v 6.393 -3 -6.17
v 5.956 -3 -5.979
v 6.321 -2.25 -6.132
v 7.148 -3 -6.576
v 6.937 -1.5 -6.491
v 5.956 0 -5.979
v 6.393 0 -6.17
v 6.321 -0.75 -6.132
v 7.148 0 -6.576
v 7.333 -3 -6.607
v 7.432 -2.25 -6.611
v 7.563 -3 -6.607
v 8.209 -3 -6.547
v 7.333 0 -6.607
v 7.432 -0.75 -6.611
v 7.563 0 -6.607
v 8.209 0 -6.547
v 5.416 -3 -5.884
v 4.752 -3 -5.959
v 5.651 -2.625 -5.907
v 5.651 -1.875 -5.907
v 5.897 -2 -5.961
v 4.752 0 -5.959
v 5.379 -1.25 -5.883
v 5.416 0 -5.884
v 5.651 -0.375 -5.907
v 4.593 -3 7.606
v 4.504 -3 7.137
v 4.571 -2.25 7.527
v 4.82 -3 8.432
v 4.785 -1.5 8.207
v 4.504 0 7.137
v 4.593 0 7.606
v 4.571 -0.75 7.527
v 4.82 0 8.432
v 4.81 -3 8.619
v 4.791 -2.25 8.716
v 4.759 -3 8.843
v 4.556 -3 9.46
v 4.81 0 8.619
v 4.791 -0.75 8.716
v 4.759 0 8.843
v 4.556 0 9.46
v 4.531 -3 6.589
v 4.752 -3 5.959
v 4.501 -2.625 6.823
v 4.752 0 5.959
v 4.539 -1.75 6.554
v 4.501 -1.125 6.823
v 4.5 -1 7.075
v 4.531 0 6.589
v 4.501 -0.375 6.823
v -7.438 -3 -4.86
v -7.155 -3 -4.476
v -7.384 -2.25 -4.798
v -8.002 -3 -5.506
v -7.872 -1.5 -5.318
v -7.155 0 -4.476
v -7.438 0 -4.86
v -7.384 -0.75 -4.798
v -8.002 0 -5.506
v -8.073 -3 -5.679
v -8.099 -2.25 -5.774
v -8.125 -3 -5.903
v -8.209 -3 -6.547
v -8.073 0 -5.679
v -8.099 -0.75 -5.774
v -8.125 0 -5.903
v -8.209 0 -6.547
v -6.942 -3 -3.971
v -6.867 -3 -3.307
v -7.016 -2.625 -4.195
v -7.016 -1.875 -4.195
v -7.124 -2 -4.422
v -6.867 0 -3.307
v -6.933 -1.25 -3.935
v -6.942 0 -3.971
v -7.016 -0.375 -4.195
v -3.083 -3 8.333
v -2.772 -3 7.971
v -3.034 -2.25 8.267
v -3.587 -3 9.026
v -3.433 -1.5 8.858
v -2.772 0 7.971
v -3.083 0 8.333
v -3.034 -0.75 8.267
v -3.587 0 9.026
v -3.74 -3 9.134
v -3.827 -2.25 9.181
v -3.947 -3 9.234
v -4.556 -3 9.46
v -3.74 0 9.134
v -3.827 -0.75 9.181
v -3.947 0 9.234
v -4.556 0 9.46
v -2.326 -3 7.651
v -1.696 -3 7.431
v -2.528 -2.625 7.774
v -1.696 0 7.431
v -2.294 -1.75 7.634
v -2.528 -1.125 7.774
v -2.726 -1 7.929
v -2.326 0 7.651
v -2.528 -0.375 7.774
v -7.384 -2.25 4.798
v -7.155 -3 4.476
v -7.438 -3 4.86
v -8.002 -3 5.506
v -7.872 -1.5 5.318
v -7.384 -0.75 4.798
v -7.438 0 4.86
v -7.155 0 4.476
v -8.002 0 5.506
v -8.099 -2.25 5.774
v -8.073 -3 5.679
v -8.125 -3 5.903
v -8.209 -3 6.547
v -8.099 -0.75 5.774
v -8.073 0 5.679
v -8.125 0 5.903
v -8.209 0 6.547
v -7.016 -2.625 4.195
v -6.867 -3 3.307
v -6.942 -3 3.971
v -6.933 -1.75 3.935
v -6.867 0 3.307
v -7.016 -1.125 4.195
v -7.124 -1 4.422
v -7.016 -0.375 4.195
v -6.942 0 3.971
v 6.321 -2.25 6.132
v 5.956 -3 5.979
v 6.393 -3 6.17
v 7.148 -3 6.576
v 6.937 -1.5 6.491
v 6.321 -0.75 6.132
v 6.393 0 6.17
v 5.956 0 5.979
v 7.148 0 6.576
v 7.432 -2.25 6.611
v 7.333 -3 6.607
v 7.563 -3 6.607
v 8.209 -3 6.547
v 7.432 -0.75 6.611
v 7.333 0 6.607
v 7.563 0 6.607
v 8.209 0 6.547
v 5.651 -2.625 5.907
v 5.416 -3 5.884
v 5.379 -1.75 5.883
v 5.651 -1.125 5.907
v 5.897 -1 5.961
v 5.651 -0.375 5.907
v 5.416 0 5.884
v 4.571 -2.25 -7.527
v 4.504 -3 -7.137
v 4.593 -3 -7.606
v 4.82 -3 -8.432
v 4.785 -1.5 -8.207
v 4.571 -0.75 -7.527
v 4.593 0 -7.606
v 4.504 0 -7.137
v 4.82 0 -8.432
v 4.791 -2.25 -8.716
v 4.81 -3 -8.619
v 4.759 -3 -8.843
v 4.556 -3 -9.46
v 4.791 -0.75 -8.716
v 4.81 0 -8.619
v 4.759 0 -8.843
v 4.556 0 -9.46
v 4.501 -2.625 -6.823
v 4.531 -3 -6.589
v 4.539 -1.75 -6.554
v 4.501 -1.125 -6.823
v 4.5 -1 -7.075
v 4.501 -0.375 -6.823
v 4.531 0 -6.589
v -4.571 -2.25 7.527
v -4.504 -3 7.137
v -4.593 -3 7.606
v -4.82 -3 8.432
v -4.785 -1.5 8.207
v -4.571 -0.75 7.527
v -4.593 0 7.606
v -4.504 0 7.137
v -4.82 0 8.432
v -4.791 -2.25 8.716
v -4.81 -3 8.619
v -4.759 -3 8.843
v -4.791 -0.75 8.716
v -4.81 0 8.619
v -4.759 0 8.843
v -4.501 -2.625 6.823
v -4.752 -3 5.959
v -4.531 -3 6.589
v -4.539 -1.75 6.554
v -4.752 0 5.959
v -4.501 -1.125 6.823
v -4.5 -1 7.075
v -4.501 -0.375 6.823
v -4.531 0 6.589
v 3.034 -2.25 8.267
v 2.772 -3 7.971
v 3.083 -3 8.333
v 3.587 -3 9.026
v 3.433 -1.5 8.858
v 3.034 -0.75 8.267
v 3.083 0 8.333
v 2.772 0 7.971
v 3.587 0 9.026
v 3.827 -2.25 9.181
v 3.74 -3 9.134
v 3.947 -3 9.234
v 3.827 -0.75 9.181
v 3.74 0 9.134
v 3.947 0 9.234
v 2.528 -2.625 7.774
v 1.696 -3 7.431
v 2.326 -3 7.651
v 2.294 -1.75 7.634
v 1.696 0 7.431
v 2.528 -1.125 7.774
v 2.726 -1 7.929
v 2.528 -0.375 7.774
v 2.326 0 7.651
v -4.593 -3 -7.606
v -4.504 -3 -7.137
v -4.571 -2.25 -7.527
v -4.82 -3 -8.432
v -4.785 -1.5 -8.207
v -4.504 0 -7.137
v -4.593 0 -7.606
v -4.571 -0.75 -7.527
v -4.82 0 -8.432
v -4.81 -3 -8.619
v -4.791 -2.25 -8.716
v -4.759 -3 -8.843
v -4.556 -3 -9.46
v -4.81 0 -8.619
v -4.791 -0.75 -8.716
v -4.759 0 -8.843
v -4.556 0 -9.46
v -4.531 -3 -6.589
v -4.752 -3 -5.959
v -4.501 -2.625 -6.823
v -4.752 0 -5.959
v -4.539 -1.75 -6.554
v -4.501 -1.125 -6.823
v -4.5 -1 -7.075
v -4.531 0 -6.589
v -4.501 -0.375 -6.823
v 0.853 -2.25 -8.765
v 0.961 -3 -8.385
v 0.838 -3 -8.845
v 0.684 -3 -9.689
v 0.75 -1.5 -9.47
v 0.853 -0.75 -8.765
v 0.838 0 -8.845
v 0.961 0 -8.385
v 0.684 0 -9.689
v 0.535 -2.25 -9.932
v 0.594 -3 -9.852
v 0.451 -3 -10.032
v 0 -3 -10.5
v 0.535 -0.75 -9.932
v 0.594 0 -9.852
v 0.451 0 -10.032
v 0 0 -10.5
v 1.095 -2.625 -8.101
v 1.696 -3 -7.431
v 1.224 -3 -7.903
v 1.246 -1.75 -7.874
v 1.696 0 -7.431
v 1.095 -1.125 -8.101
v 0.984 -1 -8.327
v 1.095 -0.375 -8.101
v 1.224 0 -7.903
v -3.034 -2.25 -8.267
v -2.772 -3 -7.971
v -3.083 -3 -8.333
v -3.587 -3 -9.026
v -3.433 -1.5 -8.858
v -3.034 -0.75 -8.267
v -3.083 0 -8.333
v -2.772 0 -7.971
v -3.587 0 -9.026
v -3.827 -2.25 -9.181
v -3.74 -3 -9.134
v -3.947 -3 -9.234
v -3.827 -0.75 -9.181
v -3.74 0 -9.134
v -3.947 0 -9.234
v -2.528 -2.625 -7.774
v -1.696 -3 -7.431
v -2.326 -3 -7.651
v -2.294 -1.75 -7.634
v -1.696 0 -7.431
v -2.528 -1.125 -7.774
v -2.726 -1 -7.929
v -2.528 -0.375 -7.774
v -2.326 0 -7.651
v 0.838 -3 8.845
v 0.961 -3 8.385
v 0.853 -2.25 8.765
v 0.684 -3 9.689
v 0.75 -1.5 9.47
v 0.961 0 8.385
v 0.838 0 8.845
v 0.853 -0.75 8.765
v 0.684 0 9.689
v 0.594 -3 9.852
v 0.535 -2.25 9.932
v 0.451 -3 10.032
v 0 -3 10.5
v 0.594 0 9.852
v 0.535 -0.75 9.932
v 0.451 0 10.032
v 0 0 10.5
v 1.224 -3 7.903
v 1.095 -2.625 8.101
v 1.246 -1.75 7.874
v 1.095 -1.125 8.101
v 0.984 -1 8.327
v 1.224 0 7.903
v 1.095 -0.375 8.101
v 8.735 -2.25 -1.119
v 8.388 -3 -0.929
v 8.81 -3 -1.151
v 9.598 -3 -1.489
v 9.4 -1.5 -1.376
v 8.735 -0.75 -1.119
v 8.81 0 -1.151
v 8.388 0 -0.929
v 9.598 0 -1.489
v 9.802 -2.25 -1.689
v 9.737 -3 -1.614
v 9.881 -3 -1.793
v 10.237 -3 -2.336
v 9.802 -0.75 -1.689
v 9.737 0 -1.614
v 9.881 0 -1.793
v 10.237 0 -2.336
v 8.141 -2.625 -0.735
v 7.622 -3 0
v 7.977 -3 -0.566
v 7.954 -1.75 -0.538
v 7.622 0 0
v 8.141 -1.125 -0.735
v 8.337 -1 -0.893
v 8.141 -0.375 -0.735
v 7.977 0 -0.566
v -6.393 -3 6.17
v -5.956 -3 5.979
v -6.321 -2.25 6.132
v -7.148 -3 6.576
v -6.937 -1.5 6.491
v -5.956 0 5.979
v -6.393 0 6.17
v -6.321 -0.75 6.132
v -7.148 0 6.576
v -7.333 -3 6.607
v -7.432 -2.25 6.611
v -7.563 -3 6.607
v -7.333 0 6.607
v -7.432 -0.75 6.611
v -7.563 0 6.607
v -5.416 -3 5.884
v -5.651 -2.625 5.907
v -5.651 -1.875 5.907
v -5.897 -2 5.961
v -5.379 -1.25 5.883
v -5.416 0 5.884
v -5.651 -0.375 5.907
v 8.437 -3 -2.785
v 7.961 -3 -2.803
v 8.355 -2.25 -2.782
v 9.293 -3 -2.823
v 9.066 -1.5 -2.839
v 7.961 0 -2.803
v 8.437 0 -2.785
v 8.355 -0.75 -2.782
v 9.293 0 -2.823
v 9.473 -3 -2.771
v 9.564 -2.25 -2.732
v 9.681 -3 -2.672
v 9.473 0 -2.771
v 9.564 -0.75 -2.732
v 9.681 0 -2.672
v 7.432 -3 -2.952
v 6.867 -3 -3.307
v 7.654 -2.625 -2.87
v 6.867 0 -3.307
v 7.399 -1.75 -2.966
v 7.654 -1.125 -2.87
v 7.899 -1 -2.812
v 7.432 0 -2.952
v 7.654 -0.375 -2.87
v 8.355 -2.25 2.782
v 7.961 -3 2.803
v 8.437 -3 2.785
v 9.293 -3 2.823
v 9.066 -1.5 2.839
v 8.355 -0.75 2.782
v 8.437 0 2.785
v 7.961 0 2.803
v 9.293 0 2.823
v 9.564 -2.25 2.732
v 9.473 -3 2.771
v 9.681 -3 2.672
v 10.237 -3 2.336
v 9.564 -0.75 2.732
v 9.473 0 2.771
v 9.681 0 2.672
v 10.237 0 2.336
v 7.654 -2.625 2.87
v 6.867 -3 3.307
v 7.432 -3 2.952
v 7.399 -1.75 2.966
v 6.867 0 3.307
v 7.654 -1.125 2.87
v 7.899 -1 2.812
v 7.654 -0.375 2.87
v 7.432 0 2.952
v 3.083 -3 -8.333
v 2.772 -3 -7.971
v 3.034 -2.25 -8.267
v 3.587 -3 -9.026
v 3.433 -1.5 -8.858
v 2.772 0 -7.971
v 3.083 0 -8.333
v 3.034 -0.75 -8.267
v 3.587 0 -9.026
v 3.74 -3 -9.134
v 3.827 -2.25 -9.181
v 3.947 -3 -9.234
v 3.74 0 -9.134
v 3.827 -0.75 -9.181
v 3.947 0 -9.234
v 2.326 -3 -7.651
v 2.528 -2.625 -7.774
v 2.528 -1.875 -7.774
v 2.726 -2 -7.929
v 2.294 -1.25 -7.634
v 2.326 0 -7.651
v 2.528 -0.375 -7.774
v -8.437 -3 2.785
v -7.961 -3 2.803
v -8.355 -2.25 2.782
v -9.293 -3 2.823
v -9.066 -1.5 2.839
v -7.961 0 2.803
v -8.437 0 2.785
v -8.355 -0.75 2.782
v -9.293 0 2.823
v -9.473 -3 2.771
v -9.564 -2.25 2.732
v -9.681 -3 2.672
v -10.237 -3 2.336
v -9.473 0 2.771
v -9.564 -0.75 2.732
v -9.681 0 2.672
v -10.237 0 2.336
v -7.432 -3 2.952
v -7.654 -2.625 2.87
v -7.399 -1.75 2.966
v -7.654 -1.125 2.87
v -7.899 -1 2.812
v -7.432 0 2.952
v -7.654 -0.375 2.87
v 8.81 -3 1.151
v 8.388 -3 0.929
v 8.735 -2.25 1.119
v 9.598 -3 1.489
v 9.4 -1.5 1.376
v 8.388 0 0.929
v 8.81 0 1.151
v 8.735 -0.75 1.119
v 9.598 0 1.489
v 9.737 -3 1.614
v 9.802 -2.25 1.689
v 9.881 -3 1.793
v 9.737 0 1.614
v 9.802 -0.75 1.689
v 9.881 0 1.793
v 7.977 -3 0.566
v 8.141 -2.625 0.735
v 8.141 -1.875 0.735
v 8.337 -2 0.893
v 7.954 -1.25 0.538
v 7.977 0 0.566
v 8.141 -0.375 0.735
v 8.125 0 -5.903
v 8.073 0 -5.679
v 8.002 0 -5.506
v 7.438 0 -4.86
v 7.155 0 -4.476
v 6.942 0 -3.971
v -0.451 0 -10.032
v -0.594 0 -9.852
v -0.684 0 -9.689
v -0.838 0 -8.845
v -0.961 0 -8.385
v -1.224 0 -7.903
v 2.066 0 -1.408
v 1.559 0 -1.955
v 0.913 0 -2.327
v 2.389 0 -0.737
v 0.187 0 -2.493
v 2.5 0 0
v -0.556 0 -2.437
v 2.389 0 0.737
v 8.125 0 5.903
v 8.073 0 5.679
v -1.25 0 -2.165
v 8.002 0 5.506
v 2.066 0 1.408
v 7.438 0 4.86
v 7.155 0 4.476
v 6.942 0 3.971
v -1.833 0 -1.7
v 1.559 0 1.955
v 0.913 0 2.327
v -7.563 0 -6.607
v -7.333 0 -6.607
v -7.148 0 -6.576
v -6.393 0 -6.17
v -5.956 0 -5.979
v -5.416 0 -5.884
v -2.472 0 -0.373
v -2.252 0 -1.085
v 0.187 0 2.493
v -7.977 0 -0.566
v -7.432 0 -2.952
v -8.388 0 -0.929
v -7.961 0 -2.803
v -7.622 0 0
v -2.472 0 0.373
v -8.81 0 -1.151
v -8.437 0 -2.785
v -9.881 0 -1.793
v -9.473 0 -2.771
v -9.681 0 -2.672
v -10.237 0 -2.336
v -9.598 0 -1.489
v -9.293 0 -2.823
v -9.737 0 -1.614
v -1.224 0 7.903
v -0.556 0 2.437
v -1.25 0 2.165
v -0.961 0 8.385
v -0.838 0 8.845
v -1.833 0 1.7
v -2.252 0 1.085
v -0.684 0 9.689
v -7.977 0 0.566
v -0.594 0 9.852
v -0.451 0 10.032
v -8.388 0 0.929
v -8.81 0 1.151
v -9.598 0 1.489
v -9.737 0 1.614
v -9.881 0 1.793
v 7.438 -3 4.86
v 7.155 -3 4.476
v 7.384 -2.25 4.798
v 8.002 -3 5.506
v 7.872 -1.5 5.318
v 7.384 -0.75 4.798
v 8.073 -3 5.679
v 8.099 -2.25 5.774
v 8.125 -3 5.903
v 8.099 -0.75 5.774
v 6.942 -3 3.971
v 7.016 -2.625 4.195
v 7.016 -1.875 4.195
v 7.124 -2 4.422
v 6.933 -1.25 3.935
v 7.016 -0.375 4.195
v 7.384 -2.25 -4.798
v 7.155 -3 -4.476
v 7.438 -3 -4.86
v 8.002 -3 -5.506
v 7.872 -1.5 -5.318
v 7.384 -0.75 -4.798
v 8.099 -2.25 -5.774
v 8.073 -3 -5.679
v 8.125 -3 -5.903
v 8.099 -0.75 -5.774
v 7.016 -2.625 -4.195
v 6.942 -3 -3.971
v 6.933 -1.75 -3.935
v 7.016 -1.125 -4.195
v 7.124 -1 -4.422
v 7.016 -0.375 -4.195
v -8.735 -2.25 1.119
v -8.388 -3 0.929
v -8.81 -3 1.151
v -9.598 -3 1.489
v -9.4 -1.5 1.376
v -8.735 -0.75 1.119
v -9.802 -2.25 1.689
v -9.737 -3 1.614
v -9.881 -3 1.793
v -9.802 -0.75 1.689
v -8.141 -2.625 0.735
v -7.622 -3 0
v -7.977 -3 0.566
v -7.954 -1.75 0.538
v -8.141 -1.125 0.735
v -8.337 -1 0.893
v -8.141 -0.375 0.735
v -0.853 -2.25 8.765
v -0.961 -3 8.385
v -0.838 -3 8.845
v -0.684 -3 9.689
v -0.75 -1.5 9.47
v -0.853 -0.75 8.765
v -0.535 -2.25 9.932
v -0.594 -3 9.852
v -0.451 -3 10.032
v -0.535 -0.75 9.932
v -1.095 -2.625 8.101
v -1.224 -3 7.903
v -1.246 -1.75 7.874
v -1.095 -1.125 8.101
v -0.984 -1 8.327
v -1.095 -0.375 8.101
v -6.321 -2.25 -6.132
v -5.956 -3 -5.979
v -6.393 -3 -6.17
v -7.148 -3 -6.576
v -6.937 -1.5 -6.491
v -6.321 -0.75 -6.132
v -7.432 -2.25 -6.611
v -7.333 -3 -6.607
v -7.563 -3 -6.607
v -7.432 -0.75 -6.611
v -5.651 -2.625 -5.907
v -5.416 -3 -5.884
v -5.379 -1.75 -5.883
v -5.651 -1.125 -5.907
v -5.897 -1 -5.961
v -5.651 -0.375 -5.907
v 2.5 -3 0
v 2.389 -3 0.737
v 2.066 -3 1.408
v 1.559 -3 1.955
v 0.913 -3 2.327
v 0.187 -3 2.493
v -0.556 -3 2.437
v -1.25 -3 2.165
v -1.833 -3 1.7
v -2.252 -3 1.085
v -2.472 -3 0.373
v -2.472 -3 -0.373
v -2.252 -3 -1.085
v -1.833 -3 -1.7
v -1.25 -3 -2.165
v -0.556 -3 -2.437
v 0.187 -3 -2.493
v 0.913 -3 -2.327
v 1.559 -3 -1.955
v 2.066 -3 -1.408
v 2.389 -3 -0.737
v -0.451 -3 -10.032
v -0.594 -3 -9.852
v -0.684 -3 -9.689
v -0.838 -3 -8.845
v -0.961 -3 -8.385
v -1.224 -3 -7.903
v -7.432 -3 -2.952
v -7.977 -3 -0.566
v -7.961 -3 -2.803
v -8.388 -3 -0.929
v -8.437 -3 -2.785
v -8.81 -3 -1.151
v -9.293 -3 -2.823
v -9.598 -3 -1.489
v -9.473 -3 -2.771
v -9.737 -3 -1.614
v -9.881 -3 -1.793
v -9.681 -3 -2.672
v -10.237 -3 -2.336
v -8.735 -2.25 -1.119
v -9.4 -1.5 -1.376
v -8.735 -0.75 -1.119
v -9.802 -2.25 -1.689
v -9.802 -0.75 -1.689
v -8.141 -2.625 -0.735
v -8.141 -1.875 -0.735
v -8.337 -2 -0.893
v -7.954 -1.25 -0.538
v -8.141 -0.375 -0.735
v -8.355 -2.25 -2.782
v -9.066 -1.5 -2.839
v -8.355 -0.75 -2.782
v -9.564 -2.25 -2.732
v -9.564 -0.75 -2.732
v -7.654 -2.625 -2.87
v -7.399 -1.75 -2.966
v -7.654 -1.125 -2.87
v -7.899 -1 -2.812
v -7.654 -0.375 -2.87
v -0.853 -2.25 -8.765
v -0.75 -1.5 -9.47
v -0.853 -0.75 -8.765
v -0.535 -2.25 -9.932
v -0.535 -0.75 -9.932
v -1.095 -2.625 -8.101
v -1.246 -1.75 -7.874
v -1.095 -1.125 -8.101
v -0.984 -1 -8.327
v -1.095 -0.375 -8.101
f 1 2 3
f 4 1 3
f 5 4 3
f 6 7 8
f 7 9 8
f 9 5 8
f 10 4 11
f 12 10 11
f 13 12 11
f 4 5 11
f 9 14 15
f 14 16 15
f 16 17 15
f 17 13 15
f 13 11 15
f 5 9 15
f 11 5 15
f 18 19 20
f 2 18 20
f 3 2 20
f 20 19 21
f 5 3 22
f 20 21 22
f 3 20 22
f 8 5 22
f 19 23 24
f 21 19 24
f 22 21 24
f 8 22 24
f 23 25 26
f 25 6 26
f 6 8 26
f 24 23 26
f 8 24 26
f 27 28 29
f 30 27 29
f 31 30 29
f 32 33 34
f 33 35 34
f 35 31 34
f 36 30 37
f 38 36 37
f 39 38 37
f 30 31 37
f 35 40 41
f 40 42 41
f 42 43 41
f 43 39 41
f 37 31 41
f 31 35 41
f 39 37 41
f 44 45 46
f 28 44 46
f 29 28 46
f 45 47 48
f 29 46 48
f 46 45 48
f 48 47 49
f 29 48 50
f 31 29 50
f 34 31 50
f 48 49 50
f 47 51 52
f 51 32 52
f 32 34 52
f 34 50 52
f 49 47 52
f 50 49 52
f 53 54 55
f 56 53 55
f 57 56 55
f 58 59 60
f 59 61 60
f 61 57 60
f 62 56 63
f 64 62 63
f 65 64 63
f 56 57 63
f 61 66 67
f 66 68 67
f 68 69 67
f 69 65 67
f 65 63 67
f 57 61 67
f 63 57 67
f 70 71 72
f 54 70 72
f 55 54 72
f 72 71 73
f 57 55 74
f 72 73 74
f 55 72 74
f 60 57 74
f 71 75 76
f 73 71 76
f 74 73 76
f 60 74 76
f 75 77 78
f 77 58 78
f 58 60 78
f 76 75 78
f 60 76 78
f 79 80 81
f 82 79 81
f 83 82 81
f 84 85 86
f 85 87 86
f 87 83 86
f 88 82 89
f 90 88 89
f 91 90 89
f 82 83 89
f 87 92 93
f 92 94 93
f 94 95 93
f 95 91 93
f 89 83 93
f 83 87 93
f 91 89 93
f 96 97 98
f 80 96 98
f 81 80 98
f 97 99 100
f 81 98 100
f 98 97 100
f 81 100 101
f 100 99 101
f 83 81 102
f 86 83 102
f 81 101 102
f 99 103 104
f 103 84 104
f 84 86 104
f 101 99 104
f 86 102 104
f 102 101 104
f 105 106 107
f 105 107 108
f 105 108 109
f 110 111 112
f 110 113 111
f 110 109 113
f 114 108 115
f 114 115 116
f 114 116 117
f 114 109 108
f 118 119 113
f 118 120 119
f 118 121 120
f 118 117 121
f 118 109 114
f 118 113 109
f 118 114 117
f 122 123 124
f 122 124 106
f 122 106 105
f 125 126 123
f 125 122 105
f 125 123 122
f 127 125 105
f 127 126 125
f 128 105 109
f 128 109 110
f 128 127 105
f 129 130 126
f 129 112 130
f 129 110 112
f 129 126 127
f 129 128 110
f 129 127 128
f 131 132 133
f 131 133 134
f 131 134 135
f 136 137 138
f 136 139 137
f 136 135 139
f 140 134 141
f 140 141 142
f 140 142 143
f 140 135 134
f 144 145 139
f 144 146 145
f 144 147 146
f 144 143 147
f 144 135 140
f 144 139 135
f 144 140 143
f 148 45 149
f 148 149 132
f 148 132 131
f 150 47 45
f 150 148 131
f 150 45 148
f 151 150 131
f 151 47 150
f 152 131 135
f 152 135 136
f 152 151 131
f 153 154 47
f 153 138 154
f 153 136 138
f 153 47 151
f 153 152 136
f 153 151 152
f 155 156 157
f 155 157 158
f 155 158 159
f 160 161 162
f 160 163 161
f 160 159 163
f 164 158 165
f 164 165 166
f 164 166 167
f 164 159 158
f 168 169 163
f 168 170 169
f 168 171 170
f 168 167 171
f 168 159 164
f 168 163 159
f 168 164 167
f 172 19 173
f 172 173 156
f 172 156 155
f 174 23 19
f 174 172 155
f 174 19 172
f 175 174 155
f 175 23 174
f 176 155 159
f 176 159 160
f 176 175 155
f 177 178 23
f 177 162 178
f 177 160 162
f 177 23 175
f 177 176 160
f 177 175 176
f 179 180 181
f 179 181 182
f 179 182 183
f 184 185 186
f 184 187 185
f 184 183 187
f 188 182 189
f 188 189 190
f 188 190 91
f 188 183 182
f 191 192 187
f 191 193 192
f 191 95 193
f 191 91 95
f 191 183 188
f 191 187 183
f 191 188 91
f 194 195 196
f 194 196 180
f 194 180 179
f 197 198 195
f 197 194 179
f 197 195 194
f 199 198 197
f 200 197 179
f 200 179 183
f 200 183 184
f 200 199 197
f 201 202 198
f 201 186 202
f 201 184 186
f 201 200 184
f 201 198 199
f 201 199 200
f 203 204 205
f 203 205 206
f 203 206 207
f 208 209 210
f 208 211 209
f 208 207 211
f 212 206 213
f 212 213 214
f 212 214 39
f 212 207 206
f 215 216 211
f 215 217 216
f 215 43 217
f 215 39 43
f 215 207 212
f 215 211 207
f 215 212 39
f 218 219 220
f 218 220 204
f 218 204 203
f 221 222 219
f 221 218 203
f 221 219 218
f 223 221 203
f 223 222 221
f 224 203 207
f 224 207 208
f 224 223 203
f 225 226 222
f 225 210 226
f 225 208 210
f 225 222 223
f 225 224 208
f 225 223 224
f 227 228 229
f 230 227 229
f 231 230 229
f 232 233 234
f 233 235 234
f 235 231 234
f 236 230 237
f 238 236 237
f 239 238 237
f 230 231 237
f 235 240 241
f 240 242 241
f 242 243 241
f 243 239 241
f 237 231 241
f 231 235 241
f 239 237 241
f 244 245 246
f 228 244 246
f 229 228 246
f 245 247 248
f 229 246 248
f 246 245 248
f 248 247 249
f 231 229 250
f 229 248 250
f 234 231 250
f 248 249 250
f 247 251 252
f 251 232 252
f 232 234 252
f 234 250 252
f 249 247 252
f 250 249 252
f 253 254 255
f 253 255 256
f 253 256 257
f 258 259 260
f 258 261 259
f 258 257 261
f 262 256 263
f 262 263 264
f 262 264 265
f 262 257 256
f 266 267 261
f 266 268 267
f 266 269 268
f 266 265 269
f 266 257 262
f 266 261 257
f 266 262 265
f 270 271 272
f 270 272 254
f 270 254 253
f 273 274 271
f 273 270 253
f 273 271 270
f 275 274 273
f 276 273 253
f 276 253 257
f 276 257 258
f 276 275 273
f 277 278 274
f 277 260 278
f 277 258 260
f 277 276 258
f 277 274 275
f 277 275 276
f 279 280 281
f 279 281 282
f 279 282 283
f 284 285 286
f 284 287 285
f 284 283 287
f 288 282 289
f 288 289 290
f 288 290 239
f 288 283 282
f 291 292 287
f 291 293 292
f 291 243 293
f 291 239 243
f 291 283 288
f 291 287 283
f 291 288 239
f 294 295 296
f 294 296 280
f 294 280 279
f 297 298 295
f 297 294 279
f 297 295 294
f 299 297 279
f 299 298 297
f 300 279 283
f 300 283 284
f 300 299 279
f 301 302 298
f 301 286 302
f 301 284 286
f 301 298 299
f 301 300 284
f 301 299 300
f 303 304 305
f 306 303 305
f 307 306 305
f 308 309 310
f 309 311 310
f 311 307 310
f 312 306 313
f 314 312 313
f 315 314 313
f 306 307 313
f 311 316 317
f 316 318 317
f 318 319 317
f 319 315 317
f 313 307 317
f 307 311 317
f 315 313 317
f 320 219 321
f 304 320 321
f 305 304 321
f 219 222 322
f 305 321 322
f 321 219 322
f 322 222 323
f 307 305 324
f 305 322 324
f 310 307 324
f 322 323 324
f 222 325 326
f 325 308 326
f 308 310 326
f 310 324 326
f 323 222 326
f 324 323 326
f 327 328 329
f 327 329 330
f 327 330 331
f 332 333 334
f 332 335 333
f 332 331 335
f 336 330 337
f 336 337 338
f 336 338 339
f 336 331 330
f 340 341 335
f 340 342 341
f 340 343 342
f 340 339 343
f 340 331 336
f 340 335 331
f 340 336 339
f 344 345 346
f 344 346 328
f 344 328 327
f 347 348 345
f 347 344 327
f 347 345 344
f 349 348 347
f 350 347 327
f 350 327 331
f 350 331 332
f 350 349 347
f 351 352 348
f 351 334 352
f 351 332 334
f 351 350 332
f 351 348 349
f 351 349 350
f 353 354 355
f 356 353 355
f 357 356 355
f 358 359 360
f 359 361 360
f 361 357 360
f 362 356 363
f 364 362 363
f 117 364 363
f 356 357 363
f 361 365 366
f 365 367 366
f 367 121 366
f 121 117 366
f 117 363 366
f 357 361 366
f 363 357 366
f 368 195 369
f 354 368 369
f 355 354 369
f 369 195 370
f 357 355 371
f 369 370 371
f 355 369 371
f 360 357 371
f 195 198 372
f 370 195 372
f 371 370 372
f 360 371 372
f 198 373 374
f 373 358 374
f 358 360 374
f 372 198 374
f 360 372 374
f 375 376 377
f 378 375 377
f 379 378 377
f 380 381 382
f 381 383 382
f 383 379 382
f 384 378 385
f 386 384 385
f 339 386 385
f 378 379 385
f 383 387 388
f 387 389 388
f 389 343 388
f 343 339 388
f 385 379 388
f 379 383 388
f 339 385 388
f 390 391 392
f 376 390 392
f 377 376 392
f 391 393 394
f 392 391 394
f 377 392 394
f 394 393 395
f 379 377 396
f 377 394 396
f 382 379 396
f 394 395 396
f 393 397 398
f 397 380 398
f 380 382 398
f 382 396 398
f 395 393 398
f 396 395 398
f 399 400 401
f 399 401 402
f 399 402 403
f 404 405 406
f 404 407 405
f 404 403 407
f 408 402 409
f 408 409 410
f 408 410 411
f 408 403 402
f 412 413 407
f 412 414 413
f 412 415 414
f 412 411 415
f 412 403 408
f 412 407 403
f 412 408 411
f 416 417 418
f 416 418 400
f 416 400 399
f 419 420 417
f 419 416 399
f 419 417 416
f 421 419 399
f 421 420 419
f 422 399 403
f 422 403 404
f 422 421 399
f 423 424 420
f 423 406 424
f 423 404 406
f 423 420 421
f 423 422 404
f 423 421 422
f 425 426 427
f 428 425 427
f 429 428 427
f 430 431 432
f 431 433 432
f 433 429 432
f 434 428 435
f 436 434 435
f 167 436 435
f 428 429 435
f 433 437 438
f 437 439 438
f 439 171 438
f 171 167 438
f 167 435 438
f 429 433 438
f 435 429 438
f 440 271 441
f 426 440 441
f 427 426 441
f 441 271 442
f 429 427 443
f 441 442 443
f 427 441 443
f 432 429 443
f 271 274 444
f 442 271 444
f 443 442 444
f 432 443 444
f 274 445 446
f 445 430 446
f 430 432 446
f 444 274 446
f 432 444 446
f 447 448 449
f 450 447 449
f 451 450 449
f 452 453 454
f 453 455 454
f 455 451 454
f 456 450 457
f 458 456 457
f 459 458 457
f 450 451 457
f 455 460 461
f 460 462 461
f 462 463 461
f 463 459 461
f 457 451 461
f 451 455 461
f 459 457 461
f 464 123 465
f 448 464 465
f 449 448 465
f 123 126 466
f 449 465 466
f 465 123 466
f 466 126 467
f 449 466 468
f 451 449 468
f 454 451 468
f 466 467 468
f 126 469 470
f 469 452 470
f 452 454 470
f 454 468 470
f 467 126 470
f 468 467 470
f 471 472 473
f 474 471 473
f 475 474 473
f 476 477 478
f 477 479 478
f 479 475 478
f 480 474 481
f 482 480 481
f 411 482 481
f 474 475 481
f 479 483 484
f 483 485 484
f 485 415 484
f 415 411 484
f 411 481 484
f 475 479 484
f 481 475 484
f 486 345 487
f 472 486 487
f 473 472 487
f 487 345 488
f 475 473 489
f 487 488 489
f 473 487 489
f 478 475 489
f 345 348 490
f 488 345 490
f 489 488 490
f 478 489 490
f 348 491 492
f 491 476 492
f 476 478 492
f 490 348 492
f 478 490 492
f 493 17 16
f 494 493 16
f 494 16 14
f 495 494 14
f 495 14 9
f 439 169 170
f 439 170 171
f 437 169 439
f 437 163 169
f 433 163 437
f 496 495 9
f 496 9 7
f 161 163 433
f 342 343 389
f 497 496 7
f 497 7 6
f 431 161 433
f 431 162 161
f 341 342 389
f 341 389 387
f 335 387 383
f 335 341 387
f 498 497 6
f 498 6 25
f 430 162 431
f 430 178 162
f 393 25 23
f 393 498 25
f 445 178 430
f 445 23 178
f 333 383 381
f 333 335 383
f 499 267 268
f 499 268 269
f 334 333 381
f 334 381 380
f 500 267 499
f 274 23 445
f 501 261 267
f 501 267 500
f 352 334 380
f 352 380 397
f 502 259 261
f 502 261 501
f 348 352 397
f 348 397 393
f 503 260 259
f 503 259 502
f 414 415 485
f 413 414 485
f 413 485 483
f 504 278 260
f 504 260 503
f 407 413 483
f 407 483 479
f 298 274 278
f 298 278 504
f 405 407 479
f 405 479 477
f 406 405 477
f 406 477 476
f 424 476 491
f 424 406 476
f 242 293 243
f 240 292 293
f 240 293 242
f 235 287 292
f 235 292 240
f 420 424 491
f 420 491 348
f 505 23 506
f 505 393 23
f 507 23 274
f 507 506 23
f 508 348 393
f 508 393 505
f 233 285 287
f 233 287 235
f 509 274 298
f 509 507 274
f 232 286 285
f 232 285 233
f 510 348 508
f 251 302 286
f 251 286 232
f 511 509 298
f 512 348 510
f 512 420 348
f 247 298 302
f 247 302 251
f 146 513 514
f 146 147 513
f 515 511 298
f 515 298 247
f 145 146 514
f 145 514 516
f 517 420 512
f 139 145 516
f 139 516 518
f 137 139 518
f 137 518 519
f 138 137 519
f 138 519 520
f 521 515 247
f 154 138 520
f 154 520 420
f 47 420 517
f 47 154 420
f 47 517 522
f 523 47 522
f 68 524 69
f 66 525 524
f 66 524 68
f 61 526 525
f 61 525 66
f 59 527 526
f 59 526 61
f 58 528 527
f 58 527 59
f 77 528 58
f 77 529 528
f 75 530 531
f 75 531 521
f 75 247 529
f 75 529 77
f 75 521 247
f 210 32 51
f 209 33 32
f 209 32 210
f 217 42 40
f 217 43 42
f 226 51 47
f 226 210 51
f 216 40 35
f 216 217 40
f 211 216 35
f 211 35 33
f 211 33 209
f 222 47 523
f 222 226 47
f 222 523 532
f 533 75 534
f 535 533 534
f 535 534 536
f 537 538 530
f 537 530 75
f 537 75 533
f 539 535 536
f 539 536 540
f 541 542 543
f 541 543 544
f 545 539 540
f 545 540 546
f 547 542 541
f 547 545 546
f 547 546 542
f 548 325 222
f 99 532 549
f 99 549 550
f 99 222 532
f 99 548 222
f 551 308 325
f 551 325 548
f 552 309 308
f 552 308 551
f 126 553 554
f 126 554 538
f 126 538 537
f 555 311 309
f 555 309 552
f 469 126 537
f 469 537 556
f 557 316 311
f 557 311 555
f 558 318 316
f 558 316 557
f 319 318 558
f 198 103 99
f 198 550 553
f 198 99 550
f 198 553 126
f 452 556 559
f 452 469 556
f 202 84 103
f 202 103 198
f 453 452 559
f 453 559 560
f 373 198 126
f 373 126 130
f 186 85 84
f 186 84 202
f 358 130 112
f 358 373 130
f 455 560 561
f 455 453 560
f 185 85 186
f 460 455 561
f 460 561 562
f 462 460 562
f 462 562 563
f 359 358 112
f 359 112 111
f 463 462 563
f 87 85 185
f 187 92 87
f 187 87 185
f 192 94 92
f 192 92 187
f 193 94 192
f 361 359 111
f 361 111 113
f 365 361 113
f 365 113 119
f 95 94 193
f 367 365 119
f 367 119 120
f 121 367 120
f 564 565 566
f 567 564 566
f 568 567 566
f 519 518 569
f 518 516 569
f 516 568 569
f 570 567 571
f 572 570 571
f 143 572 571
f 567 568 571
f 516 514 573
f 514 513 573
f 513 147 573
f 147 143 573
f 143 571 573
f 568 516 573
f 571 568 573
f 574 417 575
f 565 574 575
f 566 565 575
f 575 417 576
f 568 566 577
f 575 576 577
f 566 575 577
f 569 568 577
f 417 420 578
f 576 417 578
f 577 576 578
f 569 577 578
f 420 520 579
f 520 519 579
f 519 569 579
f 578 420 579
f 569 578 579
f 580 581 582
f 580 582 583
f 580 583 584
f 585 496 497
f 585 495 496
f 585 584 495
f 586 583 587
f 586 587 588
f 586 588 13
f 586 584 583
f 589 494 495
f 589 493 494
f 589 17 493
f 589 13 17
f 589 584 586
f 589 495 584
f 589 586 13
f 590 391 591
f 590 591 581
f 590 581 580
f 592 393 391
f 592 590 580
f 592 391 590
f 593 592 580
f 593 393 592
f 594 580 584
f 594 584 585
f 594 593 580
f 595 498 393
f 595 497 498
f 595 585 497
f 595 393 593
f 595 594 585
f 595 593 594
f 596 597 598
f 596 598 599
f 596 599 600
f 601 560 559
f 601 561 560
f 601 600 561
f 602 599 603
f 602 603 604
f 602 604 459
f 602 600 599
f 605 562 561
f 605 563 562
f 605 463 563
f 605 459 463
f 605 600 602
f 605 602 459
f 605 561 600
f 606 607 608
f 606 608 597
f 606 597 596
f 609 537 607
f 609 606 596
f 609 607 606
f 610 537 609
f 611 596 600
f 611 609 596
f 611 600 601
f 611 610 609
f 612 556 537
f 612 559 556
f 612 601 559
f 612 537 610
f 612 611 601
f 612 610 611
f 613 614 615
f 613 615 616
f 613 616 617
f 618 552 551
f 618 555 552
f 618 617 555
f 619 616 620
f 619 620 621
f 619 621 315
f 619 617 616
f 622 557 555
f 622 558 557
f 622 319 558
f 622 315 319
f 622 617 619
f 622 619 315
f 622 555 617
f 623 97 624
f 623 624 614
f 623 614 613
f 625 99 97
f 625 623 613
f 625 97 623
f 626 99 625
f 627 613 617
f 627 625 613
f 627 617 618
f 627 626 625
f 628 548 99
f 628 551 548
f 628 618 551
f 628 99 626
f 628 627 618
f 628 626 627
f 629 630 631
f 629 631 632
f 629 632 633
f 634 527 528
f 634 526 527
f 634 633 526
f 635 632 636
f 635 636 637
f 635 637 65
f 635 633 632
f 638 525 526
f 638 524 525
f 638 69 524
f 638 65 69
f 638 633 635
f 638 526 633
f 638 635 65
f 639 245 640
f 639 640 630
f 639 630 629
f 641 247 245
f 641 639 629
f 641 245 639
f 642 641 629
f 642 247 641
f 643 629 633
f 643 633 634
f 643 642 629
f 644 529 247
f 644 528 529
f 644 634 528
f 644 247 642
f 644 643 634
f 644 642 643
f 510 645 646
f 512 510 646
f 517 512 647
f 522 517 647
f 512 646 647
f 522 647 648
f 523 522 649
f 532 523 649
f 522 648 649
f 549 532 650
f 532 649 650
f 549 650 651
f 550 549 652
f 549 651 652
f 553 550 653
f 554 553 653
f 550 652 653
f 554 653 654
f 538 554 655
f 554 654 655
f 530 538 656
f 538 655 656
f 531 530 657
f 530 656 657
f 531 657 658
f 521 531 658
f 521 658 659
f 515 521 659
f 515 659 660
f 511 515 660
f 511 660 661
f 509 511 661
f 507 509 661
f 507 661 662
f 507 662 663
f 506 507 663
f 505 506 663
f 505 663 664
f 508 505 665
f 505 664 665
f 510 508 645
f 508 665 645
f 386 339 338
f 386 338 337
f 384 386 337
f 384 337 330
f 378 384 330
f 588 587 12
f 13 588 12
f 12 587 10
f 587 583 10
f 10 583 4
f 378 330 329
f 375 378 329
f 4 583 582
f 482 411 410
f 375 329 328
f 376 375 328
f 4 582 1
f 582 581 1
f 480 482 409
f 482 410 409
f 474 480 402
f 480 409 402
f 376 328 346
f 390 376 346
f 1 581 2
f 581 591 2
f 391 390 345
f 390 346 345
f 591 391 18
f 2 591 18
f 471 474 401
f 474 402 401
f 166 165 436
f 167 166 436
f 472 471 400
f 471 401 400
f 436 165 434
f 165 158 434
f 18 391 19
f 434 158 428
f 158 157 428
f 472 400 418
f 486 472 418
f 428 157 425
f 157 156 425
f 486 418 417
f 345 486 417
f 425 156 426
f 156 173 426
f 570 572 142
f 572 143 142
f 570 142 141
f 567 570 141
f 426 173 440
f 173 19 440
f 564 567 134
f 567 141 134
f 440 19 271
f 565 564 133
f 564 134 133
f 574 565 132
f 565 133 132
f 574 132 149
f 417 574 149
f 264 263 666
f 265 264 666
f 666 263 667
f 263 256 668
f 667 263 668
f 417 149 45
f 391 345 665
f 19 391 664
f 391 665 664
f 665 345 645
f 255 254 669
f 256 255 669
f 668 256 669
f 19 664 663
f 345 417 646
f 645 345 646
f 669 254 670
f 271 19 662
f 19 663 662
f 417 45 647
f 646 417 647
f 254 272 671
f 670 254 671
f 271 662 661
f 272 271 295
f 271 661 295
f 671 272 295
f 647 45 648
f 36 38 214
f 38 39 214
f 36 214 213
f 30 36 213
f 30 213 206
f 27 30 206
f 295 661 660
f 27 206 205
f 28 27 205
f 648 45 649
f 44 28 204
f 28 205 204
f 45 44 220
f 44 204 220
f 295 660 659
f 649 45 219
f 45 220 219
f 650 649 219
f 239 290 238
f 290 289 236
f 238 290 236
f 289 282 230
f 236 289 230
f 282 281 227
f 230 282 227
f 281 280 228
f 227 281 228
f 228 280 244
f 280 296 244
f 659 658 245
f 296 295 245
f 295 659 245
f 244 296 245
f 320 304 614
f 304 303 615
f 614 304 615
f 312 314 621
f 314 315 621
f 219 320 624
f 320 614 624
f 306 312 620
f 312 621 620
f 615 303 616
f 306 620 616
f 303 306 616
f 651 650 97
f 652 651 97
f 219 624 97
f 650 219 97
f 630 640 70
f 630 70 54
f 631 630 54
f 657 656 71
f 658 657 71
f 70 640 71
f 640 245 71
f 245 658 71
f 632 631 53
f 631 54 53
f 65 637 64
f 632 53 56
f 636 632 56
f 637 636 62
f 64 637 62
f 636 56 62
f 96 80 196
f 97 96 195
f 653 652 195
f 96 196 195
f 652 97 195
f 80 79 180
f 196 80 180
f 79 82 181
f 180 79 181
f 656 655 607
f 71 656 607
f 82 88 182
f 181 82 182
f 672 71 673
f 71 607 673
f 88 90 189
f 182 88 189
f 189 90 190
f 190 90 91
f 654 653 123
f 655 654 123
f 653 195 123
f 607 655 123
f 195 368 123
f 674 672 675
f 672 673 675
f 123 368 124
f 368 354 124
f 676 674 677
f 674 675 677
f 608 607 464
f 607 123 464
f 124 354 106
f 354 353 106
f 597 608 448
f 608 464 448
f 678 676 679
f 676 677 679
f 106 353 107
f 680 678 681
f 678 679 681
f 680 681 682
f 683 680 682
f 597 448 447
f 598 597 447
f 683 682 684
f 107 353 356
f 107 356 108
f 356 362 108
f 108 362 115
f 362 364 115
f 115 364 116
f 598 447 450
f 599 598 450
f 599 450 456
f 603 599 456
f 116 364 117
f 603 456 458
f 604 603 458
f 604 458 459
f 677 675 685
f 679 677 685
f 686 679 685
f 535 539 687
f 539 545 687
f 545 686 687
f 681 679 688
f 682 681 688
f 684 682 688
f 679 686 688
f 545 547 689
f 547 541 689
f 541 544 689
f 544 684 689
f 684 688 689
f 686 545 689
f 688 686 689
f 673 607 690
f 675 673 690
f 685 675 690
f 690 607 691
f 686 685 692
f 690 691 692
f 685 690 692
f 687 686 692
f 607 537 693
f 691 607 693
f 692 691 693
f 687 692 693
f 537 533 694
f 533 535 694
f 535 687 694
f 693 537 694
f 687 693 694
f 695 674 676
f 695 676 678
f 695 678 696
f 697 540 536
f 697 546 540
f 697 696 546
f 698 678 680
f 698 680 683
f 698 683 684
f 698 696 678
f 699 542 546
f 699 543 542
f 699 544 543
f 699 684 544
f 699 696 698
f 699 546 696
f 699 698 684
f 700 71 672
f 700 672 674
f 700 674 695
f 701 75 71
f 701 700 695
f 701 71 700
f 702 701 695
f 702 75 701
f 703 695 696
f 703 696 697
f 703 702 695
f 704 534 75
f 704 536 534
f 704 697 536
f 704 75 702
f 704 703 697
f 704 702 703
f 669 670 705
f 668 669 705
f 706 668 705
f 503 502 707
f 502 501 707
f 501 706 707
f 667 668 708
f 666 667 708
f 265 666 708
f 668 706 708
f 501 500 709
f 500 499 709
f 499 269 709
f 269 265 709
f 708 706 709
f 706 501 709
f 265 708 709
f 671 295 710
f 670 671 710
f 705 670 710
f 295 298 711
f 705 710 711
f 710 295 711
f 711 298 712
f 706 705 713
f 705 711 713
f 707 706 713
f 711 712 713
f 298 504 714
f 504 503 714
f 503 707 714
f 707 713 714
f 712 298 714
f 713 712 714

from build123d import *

# Parameters (mm, degrees)
F1_DEPTH = 3
F3_COUNT = 14
F4_R     = 2.5
F5_DEPTH = 3


with BuildPart() as f1:
    # F0 (on Front) → F1 (new body)
    with BuildSketch(Plane.XZ):
        with BuildLine():
            add(Edge.make_bspline(
                [(-2, 7.2284161474), (-0.75, 7.964766161), (-0.9274404252, 9.6336122631), (-0.5, 9.9874921777), (0, 10.5)],
                knots=[0, 0, 0, 0, 0.5866954627, 1, 1, 1, 1], degree=3))
            ThreePointArc((-2, 7.2284161474), (0, -7.5), (2, 7.2284161474))
            add(Edge.make_bspline(
                [(2, 7.2284161474), (0.75, 7.964766161), (0.9274404252, 9.6336122631), (0.5, 9.9874921777), (0, 10.5)],
                knots=[0, 0, 0, 0, 0.5866954627, 1, 1, 1, 1], degree=3))
        make_face()
    extrude(amount=F1_DEPTH)

    # F3: F1 ×14 about axis
    f3_axis = Axis((0, 2.5461101905, 0), (0, 1, 0))


with BuildPart() as f1_1:
    add(f1.part)
    for i in range(1, F3_COUNT):
        add(f1.part.rotate(f3_axis, i * 360 / F3_COUNT))

    # F4 (on face) → F5 (cut, through all)
    with BuildSketch(Plane.XZ.offset(3)):
        Circle(F4_R)
    extrude(amount=-F5_DEPTH, mode=Mode.SUBTRACT)


solid = f1_1.part
